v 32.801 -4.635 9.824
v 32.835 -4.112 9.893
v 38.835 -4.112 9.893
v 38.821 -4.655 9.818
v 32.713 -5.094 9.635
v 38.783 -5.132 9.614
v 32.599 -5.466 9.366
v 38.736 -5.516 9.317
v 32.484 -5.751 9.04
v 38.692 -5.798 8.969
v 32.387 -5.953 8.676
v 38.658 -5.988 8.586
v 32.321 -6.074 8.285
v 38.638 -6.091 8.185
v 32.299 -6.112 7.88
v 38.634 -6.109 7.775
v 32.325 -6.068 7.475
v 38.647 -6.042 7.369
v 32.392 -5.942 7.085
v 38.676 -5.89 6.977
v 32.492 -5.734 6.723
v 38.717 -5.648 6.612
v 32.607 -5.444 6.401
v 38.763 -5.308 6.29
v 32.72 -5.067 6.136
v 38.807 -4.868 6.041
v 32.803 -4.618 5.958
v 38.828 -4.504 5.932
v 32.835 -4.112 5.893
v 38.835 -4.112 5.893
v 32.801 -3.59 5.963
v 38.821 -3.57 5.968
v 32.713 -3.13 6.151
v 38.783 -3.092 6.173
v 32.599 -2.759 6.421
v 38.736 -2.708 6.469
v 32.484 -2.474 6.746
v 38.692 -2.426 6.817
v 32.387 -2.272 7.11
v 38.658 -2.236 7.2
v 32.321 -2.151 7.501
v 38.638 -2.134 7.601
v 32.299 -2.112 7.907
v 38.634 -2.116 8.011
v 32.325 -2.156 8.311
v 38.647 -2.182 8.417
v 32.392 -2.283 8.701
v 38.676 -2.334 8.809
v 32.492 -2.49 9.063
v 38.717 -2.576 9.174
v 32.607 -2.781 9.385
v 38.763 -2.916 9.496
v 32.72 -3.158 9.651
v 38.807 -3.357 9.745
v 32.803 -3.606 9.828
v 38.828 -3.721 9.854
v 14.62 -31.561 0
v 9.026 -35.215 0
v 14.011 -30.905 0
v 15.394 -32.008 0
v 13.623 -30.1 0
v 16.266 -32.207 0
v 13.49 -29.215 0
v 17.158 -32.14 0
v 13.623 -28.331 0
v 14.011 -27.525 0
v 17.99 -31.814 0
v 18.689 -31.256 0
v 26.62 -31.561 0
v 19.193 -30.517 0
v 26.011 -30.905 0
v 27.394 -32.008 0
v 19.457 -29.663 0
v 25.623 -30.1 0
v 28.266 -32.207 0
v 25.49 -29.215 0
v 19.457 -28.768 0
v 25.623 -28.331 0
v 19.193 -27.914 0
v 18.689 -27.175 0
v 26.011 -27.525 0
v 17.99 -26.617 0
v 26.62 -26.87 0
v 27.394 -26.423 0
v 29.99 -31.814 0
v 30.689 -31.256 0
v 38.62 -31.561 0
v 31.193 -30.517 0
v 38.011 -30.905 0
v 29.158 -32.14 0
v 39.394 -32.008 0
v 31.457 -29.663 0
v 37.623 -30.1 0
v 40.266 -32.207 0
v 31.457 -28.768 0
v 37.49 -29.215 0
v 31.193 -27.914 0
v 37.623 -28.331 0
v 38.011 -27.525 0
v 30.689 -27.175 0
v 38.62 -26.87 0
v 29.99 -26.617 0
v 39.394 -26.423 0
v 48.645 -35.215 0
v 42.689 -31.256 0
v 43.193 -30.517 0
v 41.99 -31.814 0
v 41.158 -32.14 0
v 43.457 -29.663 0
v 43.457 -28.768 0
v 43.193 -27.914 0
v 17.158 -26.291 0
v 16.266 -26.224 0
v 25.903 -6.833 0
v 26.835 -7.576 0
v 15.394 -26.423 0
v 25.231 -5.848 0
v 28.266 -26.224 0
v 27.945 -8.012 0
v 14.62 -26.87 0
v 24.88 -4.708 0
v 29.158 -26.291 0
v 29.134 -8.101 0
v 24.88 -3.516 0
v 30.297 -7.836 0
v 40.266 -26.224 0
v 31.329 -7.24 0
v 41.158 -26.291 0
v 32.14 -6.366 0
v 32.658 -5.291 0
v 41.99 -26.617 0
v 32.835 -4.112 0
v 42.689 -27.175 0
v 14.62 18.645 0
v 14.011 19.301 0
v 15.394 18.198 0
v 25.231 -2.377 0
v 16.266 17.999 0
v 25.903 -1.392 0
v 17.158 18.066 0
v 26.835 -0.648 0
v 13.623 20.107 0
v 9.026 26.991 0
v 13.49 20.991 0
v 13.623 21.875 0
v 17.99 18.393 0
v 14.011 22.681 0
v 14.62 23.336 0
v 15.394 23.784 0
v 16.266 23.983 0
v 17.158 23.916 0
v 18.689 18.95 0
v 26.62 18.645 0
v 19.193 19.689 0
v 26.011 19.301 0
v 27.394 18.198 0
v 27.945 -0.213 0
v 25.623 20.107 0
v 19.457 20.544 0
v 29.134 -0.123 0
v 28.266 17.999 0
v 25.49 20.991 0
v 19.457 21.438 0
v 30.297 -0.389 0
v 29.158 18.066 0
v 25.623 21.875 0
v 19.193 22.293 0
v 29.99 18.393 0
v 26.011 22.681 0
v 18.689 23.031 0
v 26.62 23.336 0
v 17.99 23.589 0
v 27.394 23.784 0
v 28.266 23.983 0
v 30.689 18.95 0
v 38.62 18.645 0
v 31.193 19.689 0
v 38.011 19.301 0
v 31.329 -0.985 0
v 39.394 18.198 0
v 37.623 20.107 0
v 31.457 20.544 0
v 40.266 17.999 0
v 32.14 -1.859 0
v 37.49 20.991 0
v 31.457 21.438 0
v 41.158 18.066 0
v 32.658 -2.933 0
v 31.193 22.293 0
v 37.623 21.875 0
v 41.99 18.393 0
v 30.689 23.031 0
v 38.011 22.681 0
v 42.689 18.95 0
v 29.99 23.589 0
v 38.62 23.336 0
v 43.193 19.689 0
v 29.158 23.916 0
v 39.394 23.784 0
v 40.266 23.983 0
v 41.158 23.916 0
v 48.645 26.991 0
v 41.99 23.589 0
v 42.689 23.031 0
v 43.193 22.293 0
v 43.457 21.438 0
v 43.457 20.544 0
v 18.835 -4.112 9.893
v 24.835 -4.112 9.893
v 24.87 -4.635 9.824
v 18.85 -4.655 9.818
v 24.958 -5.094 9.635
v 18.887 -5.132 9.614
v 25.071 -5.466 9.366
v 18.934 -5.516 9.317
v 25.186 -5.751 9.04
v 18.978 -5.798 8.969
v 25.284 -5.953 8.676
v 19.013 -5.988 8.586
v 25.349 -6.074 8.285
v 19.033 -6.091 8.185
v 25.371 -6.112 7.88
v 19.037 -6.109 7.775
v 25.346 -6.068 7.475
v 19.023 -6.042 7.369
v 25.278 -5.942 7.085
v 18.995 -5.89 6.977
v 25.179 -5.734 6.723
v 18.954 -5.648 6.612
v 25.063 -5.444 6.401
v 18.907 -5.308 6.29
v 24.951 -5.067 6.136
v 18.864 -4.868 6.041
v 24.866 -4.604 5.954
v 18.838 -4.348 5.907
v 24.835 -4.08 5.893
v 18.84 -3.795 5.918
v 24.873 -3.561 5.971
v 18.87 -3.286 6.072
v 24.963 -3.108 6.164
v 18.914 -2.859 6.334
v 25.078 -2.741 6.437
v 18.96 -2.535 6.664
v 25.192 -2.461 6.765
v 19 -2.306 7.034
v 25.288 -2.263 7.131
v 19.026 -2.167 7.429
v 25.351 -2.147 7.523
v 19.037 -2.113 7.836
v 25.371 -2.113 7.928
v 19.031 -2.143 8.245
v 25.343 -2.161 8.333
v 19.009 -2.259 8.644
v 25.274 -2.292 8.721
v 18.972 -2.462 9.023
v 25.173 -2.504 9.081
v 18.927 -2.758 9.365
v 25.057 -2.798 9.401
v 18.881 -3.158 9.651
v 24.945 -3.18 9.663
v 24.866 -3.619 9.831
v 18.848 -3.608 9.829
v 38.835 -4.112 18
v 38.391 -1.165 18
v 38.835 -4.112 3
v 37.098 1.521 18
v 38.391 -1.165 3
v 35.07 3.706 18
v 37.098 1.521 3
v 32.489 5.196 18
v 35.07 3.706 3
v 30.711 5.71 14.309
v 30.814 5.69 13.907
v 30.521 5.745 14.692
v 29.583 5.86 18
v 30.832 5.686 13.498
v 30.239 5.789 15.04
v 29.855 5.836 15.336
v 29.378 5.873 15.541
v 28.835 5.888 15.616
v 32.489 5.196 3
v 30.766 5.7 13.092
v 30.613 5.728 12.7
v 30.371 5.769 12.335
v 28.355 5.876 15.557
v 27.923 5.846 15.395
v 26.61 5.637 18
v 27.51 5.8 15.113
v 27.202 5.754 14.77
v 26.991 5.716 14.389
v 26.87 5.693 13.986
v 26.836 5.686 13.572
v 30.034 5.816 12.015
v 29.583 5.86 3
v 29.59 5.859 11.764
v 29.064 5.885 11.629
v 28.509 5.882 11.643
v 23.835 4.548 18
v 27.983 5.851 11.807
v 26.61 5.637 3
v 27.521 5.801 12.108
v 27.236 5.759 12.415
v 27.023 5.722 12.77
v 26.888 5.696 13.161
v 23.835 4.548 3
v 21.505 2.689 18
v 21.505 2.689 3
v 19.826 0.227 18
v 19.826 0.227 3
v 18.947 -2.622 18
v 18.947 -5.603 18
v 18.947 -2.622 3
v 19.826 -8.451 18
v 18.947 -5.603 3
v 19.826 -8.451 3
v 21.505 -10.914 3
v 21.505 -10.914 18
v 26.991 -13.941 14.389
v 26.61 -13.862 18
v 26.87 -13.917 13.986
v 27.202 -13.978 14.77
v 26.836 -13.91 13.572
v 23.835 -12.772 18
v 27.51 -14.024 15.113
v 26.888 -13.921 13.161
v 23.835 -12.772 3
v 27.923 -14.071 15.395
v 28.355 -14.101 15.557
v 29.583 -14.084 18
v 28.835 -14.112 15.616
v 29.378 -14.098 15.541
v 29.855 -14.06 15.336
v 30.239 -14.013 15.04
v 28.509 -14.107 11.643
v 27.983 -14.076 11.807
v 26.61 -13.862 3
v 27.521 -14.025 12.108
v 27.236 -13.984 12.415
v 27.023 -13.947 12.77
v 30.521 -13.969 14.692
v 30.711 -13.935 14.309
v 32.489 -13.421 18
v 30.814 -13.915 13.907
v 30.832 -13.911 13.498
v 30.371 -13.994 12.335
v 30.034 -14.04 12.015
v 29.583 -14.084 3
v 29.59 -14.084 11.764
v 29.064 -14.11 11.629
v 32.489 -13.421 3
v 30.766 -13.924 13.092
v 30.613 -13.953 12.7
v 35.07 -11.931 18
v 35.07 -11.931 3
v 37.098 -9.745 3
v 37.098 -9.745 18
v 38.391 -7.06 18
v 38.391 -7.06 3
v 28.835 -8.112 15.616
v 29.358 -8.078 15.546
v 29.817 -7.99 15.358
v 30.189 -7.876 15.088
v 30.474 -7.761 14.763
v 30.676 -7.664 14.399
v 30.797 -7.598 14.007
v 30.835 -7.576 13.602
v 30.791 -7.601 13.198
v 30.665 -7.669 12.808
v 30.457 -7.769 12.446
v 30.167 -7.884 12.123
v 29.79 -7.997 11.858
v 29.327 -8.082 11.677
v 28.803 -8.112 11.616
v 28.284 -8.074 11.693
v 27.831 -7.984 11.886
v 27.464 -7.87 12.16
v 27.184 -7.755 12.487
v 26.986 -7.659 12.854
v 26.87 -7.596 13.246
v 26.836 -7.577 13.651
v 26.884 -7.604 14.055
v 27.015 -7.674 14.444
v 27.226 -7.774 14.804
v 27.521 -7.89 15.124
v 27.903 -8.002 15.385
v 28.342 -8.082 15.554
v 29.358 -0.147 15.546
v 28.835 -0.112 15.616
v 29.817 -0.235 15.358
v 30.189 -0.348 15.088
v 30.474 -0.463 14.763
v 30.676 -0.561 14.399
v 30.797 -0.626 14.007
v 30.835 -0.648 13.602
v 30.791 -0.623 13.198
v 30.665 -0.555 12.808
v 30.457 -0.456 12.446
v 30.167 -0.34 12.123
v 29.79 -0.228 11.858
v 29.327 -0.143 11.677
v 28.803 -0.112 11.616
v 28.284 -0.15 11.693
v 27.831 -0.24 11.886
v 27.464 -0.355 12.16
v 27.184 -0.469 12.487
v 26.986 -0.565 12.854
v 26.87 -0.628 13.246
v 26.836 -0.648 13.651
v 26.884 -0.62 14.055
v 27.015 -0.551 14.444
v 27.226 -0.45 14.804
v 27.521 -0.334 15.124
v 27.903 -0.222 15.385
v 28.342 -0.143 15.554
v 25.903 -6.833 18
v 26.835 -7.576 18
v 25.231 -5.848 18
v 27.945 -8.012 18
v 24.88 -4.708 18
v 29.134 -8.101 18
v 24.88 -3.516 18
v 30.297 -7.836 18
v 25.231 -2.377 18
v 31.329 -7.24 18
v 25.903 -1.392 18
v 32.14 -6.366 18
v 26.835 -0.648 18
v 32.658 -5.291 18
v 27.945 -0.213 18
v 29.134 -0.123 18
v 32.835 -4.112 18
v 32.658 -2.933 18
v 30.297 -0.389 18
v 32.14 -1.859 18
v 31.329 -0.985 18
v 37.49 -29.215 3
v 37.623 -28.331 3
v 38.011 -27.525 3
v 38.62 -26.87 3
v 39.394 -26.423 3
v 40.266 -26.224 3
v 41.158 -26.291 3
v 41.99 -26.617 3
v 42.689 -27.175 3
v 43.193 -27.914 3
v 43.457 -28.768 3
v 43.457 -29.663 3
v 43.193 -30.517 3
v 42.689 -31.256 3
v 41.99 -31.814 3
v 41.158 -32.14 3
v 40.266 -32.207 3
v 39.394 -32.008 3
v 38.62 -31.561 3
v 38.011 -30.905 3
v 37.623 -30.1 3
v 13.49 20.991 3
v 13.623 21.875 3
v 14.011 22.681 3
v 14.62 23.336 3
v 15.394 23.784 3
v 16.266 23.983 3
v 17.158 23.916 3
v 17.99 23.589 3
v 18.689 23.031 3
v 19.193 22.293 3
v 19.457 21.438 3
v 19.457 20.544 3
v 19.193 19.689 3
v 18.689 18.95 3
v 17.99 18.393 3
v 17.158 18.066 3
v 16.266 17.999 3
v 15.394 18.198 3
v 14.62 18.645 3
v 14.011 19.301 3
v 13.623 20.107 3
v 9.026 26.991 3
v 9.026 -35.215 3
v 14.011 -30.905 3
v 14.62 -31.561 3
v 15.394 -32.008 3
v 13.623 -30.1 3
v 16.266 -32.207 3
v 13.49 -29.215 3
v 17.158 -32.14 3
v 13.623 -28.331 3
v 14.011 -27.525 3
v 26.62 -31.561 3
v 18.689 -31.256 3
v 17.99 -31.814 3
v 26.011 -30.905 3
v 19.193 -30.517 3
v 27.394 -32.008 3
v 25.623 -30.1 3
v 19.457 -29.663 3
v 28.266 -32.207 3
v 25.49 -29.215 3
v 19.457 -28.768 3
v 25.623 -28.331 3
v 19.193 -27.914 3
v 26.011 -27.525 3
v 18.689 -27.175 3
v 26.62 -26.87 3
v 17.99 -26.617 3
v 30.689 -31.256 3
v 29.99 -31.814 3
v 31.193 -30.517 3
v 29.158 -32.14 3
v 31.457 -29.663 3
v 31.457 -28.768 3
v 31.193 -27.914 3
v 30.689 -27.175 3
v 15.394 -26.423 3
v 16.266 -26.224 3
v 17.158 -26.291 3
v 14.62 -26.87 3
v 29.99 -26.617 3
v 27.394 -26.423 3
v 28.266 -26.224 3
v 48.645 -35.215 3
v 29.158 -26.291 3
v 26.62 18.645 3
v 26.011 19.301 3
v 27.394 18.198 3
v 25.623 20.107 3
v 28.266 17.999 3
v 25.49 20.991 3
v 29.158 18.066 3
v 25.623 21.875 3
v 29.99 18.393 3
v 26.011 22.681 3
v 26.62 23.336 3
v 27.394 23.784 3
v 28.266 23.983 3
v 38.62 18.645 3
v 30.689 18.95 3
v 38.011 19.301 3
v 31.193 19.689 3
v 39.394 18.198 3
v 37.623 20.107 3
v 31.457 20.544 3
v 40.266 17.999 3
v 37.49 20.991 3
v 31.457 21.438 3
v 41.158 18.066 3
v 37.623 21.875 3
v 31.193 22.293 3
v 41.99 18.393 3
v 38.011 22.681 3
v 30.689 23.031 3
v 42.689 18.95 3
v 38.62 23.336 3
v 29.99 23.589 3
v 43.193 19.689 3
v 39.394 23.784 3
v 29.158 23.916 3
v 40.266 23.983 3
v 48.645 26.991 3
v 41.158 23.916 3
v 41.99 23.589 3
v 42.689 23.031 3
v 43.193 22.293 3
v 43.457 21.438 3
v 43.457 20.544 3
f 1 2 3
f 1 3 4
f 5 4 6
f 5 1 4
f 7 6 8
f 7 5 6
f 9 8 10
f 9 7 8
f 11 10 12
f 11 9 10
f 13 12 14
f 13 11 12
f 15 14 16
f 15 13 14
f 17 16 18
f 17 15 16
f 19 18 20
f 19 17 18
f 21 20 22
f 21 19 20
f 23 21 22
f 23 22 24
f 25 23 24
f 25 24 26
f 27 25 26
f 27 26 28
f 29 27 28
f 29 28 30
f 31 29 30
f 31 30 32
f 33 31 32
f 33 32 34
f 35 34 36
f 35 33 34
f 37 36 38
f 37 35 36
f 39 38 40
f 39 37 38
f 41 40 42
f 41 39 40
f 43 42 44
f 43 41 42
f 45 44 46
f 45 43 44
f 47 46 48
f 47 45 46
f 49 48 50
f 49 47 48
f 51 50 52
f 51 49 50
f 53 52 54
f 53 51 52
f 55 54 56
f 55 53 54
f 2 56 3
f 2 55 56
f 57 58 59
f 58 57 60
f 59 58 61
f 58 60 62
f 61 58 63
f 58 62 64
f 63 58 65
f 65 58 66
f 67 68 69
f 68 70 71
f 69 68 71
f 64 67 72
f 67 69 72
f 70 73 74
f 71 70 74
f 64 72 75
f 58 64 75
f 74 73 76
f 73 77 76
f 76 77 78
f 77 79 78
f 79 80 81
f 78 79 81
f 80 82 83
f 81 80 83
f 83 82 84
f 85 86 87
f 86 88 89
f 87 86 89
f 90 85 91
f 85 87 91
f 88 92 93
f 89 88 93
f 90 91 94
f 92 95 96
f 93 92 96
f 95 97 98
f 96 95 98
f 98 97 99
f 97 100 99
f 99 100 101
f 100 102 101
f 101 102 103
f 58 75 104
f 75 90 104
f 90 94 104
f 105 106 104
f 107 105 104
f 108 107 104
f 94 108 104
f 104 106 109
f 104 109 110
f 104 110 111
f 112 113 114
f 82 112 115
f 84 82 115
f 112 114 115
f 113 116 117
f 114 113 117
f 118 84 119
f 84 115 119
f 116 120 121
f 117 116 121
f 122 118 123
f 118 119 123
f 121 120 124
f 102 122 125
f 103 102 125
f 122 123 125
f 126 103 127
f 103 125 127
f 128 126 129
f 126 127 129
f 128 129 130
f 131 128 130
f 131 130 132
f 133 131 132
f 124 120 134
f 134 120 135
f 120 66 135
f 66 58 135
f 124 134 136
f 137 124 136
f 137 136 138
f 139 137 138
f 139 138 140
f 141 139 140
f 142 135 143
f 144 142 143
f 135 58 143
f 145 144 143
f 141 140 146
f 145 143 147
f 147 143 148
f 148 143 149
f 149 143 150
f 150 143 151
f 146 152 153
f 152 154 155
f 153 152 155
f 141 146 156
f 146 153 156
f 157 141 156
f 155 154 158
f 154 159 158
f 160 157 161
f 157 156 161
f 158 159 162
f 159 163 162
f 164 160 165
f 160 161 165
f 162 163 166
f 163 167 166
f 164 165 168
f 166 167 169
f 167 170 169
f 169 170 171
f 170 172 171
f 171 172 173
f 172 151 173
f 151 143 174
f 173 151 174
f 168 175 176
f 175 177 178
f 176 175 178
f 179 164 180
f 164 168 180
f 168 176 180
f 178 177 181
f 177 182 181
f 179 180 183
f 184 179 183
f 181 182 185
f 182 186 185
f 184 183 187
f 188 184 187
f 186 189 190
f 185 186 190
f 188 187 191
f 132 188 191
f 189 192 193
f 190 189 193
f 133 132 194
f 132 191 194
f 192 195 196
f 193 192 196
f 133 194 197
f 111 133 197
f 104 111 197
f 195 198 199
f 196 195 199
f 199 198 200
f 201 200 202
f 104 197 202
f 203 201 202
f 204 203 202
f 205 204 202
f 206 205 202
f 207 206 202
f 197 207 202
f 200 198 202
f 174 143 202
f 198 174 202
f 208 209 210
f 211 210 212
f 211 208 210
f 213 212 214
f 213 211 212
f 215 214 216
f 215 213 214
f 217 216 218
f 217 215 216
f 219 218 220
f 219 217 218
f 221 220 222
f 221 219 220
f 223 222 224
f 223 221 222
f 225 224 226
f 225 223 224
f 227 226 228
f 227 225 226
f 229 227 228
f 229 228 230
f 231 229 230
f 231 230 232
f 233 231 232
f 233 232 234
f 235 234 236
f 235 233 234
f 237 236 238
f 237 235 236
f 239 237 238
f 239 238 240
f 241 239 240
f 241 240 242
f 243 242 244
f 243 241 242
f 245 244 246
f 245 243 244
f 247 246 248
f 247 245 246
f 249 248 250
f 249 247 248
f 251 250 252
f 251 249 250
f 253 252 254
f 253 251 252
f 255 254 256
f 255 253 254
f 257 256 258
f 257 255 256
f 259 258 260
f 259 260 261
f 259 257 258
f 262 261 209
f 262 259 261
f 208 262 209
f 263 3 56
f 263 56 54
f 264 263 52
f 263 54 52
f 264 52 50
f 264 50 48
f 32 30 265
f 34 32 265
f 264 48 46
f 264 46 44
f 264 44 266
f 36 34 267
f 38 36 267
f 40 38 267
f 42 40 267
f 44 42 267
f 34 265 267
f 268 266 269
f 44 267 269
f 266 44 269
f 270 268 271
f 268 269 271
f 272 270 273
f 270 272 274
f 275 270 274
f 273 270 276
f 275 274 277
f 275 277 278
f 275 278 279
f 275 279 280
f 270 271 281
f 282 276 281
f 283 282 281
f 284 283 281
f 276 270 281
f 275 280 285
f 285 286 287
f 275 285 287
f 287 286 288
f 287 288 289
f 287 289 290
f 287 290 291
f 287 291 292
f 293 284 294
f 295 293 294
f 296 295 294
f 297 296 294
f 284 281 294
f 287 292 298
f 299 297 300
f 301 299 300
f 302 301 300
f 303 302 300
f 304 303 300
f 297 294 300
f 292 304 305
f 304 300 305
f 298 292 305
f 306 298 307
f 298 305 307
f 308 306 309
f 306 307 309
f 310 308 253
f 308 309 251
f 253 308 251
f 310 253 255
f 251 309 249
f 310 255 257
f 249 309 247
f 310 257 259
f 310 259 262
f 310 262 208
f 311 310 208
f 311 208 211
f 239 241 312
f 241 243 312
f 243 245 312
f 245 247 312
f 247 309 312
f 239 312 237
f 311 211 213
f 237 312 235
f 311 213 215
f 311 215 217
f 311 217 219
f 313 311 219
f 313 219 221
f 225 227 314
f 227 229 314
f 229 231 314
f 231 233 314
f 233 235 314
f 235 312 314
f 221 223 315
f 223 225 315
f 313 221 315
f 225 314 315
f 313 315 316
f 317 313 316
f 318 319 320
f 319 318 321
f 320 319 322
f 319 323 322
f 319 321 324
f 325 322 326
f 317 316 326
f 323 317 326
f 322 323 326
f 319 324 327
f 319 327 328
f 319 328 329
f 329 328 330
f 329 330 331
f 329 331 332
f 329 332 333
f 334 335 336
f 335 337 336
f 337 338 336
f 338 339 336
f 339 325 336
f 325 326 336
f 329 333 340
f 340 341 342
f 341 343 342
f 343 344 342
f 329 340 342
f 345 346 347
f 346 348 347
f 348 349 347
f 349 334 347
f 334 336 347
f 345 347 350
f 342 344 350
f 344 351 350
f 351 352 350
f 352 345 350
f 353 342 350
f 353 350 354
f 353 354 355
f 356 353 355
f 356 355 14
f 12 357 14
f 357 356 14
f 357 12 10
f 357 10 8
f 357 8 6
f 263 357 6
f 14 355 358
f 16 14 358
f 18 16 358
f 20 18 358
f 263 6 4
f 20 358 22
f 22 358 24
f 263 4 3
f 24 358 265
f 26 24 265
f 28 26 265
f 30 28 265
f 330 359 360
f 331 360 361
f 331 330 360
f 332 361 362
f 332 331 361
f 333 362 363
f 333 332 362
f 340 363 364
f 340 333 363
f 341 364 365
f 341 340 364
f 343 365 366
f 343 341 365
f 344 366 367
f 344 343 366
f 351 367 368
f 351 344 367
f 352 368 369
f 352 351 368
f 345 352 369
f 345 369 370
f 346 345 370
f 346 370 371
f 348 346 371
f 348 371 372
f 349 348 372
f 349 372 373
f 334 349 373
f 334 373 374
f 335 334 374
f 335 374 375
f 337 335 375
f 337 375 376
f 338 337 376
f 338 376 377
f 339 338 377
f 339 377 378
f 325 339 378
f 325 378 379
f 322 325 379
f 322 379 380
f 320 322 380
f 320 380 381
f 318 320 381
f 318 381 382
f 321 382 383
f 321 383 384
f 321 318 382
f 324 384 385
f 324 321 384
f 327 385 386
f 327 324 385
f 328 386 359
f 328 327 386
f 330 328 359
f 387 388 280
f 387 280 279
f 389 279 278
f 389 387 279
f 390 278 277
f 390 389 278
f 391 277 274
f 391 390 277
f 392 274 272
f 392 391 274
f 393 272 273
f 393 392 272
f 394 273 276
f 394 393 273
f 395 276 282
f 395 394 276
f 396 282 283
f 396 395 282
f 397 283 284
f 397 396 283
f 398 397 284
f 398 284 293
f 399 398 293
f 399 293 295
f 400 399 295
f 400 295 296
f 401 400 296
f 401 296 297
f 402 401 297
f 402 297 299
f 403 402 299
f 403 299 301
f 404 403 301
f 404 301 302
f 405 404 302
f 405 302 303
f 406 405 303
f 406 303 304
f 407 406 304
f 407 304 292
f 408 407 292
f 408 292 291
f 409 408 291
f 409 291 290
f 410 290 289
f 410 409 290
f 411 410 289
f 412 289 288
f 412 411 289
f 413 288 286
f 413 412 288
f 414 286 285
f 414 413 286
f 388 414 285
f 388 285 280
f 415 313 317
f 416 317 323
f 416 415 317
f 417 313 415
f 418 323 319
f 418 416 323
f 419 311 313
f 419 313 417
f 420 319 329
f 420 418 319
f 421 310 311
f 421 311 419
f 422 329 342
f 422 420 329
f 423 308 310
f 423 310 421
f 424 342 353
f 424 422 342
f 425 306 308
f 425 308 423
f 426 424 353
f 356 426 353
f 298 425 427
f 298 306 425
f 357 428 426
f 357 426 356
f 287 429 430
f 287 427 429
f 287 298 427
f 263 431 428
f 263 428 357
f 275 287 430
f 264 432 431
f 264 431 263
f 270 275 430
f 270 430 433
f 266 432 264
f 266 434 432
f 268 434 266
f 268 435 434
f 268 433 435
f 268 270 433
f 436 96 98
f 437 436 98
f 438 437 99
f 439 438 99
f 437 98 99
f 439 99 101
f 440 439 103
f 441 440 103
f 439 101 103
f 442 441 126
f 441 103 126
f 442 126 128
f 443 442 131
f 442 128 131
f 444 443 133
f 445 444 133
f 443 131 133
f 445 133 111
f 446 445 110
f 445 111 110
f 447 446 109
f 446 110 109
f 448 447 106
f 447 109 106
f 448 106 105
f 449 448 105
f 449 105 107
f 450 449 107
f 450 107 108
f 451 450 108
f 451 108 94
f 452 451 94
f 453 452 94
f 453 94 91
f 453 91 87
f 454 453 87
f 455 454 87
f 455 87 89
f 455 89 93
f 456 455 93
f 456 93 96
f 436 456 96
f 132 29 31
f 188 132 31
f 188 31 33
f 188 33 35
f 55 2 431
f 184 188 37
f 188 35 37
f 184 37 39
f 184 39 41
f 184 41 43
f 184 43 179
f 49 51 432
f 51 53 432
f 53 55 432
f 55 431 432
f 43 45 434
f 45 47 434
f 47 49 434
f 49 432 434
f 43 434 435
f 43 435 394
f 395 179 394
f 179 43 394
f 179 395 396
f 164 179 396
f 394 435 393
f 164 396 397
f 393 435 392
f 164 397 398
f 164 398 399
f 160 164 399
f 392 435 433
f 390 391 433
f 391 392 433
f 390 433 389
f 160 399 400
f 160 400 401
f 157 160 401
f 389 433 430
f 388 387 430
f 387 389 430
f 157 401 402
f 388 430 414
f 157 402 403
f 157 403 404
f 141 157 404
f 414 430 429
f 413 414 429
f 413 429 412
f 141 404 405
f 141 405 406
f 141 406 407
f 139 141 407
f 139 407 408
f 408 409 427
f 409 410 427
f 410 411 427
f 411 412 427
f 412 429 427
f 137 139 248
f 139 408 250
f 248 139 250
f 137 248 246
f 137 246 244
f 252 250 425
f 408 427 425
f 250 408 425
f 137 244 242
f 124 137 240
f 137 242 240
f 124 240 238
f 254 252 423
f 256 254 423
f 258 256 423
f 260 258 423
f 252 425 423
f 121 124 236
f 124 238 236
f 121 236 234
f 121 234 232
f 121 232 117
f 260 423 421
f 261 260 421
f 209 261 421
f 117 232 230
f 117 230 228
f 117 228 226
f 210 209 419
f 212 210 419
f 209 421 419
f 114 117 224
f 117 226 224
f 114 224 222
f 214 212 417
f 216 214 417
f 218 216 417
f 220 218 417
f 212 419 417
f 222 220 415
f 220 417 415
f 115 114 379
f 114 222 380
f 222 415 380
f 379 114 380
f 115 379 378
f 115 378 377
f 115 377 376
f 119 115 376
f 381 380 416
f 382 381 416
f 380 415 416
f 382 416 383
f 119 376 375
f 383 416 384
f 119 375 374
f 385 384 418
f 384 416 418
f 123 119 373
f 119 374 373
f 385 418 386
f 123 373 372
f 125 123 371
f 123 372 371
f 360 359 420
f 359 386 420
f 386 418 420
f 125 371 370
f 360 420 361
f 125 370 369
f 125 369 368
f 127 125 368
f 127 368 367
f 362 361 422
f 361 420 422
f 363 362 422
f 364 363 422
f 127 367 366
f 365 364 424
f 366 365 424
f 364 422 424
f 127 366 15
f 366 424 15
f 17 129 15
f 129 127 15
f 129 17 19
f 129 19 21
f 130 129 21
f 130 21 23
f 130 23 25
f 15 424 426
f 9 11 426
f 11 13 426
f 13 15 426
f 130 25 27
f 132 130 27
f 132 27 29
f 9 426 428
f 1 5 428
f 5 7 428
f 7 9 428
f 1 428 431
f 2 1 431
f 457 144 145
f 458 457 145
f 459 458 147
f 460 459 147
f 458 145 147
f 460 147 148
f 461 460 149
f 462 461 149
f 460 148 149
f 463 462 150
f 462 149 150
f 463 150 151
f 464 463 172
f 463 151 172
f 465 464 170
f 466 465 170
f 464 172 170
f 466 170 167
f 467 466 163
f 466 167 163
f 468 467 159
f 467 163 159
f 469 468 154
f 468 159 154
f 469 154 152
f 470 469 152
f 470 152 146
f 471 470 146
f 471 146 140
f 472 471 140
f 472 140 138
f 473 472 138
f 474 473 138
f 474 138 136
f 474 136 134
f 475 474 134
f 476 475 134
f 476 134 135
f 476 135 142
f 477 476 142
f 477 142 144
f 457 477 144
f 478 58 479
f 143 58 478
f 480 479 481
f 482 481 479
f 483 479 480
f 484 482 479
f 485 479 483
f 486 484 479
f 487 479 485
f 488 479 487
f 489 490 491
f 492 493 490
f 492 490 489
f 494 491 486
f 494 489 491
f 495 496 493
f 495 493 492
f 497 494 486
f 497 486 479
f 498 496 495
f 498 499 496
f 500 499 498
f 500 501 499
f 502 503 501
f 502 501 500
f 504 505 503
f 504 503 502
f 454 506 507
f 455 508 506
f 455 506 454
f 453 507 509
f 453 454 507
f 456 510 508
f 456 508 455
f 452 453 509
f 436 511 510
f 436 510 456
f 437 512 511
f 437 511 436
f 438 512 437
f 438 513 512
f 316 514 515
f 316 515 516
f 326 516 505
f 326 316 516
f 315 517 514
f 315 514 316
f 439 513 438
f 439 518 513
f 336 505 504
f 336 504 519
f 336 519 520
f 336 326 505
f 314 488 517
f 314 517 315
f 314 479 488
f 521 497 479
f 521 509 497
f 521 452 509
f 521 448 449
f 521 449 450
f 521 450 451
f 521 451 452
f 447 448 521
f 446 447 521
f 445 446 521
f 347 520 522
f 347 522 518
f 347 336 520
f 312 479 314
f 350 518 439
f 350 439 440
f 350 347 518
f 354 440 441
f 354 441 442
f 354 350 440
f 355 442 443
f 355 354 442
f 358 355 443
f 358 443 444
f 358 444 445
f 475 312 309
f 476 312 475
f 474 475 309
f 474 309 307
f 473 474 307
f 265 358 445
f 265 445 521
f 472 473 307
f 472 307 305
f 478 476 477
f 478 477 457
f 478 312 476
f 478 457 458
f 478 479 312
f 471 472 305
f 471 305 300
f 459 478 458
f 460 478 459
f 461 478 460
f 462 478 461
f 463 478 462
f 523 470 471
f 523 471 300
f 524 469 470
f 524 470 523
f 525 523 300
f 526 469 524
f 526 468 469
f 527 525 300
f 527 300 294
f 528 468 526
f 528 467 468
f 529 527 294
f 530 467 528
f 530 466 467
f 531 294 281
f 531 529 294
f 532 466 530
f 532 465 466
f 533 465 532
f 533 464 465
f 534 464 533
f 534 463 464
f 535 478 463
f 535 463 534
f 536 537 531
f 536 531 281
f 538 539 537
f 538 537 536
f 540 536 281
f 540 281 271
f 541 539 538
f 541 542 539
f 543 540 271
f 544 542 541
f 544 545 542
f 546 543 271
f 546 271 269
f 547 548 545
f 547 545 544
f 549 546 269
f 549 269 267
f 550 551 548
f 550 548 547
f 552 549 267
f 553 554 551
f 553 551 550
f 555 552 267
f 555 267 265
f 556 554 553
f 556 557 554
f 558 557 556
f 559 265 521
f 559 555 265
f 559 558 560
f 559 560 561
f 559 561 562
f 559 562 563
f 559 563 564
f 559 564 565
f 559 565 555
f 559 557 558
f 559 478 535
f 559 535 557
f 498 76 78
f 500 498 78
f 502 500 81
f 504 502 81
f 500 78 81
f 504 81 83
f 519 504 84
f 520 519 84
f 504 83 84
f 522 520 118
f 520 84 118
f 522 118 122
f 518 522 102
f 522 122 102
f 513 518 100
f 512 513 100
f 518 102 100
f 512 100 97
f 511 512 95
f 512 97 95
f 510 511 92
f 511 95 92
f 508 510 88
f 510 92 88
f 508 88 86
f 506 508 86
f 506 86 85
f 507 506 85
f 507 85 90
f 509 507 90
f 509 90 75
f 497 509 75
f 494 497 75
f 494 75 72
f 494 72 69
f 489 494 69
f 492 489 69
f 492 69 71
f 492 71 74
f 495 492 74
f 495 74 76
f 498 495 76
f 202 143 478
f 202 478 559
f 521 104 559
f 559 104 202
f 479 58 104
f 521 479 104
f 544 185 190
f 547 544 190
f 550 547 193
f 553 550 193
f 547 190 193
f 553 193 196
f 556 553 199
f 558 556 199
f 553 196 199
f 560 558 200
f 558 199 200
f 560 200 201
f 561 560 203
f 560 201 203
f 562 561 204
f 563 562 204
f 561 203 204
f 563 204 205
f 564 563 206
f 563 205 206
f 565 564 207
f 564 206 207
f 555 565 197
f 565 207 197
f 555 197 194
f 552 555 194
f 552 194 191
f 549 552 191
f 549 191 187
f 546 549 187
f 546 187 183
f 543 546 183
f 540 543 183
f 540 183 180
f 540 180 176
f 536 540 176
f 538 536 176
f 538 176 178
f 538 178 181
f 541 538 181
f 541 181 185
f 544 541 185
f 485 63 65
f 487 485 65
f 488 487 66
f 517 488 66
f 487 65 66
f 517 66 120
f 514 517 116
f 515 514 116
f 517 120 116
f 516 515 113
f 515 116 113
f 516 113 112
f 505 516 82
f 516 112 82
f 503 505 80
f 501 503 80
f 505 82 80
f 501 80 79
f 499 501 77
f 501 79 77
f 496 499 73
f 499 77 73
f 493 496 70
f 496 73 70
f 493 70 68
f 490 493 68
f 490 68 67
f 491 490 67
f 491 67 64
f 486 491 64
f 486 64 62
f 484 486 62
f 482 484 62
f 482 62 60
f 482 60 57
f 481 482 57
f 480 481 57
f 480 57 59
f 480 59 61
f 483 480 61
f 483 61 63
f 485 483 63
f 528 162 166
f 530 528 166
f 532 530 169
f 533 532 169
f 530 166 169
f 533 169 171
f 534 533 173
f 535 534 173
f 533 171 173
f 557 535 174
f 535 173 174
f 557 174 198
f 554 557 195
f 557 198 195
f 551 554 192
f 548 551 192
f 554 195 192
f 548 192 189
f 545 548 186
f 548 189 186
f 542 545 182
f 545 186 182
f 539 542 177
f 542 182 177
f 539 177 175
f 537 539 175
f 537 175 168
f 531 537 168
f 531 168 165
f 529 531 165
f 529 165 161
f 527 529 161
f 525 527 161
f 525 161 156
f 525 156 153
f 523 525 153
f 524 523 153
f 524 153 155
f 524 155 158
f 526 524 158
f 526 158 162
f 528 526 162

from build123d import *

# Parameters (mm, degrees)
CROQUIS1_W                 = 39.618473901
CROQUIS1_H                 = 62.206373563
SALIENTE_EXTRUIR1_DEPTH    = 3
CROQUIS2_R                 = 10
SALIENTE_EXTRUIR2_DEPTH    = 15
CROQUIS3_R                 = 4
CORTAR_EXTRUIR1_DEPTH      = 63.693025162
CORTAR_EXTRUIR3_DEPTH      = 63.693025162
CORTAR_EXTRUIR3_DEPTH_BACK = 63.693025162
CROQUIS5_R                 = 2
CROQUIS6_R                 = 3
CORTAR_EXTRUIR4_DEPTH      = 10
CORTAR_EXTRUIR5_DEPTH      = 63.69302519
CORTAR_EXTRUIR5_DEPTH_BACK = 63.69302519
CROQUIS7_R                 = 2


with BuildPart() as part:
    # Croquis1 → Saliente-Extruir1 (new body)
    with BuildSketch(Plane.XY):
        with Locations((28.835278497, -4.112243371)):
            Rectangle(CROQUIS1_W, CROQUIS1_H)
    extrude(amount=SALIENTE_EXTRUIR1_DEPTH)

    # Croquis2 → Saliente-Extruir2 (add)
    with BuildSketch(Plane.XY.offset(3)):
        with Locations((28.835278496, -4.112243372)):
            Circle(CROQUIS2_R)
    extrude(amount=SALIENTE_EXTRUIR2_DEPTH)

    # Croquis3 → Cortar-Extruir1 (cut, through all)
    with BuildSketch(Plane.XY.offset(18)):
        with Locations((28.835278496, -4.112243372)):
            Circle(CROQUIS3_R)
    extrude(amount=-CORTAR_EXTRUIR1_DEPTH, mode=Mode.SUBTRACT)

    # Croquis5 → Cortar-Extruir3 (cut, two sides: drawn at the far end of the back side and taken through both)
    with BuildSketch(Plane(origin=(0, 0, 0), x_dir=(0, 0, -1), z_dir=(1, 0, 0)).offset(-CORTAR_EXTRUIR3_DEPTH_BACK)):
        with Locations(Location((-7.893110832, -4.112243372, 0), (0, 0, 180))):
            Circle(CROQUIS5_R)
    extrude(amount=CORTAR_EXTRUIR3_DEPTH + CORTAR_EXTRUIR3_DEPTH_BACK, mode=Mode.SUBTRACT)

    # Croquis6 → Cortar-Extruir4 (cut)
    with BuildSketch(Plane(origin=(0, 0, 0), x_dir=(-1, 0, 0), z_dir=(0, 0, -1))):
        with Locations((-40.490083912, -29.215430153)):
            Circle(CROQUIS6_R)
        with Locations((-28.490083912, -29.215430153)):
            Circle(CROQUIS6_R)
        with Locations((-16.490083912, -29.215430153)):
            Circle(CROQUIS6_R)
        with Locations((-28.490083912, 20.99094341)):
            Circle(CROQUIS6_R)
        with Locations((-40.490083912, 20.99094341)):
            Circle(CROQUIS6_R)
        with Locations((-16.490083912, 20.99094341)):
            Circle(CROQUIS6_R)
    extrude(amount=-CORTAR_EXTRUIR4_DEPTH, mode=Mode.SUBTRACT)

    # Croquis7 → Cortar-Extruir5 (cut, two sides: drawn at the far end of the back side and taken through both)
    with BuildSketch(Plane(origin=(0, 0, 0), x_dir=(1, 0, 0), z_dir=(0, 1, 0)).offset(-CORTAR_EXTRUIR5_DEPTH_BACK)):
        with Locations(Location((28.835278496, -13.615803353, 0), (0, 0, 270))):
            Circle(CROQUIS7_R)
    extrude(amount=CORTAR_EXTRUIR5_DEPTH + CORTAR_EXTRUIR5_DEPTH_BACK, mode=Mode.SUBTRACT)


solid = part.part
